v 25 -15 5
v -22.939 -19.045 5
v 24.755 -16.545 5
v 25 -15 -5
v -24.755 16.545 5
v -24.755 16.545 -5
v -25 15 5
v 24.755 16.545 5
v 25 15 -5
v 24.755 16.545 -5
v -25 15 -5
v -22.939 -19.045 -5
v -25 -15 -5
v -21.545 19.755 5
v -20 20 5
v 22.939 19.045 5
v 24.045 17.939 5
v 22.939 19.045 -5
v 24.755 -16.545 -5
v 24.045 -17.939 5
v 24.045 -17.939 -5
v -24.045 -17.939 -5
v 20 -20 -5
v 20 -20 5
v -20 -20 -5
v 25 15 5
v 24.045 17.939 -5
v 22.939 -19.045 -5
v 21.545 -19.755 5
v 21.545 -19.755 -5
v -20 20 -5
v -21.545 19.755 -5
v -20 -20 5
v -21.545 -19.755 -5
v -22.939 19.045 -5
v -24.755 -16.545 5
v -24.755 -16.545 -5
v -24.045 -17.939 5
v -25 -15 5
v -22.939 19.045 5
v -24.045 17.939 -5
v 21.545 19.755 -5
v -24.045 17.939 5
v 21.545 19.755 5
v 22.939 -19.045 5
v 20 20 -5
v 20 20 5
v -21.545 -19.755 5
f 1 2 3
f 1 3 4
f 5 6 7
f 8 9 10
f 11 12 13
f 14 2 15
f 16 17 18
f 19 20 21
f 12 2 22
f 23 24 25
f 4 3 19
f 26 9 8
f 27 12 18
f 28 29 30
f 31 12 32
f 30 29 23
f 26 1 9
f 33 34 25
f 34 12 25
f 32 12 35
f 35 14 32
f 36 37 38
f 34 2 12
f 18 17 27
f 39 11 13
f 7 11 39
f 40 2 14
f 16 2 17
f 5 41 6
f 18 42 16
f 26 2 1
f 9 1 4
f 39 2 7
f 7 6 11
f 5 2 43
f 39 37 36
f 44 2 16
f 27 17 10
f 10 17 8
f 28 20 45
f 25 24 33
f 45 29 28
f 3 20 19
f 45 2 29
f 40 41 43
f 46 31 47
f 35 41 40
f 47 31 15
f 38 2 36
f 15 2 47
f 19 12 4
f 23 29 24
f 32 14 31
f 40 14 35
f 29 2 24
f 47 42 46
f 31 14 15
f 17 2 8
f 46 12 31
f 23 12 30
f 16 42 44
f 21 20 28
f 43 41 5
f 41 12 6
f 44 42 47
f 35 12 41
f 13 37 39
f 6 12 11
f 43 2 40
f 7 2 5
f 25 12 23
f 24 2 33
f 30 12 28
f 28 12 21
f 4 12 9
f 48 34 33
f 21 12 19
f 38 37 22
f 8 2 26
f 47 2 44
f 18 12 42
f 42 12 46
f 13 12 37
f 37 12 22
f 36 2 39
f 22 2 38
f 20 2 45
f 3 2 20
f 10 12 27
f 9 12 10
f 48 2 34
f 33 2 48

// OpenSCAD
//-- Parametros de la caja
lx = 50;  //-- Longitud en eje x
ly = 40;  //-- Longitud en eje y
r = 5;    //-- Radio del redondeo de las esquinas
h = 10;   //-- Altura

//-- Coordenadas del cilindro del primer cuadrante
cx = lx/2 - r;
cy = ly/2 - r;

//-- Posicion de los 4 cilindros de las esquinas
P1 = [cx, cy, 0];
P2 = [-cx, cy, 0];
P3 = [-cx, -cy, 0];
P4 = [cx, -cy, 0];


//-- Obtener el menor objeto convexo que contiene
//--   los 4 cilindros
hull() {
  translate(P1)
    cylinder(r = r, h = h, center = true, $fn = 20);
    
  translate(P2)
    cylinder(r = r, h = h, center = true, $fn = 20);
    
  translate(P3)
    cylinder(r = r, h = h, center = true, $fn = 20);
    
  translate(P4)
    cylinder(r = r, h = h, center = true, $fn = 20);  
}
